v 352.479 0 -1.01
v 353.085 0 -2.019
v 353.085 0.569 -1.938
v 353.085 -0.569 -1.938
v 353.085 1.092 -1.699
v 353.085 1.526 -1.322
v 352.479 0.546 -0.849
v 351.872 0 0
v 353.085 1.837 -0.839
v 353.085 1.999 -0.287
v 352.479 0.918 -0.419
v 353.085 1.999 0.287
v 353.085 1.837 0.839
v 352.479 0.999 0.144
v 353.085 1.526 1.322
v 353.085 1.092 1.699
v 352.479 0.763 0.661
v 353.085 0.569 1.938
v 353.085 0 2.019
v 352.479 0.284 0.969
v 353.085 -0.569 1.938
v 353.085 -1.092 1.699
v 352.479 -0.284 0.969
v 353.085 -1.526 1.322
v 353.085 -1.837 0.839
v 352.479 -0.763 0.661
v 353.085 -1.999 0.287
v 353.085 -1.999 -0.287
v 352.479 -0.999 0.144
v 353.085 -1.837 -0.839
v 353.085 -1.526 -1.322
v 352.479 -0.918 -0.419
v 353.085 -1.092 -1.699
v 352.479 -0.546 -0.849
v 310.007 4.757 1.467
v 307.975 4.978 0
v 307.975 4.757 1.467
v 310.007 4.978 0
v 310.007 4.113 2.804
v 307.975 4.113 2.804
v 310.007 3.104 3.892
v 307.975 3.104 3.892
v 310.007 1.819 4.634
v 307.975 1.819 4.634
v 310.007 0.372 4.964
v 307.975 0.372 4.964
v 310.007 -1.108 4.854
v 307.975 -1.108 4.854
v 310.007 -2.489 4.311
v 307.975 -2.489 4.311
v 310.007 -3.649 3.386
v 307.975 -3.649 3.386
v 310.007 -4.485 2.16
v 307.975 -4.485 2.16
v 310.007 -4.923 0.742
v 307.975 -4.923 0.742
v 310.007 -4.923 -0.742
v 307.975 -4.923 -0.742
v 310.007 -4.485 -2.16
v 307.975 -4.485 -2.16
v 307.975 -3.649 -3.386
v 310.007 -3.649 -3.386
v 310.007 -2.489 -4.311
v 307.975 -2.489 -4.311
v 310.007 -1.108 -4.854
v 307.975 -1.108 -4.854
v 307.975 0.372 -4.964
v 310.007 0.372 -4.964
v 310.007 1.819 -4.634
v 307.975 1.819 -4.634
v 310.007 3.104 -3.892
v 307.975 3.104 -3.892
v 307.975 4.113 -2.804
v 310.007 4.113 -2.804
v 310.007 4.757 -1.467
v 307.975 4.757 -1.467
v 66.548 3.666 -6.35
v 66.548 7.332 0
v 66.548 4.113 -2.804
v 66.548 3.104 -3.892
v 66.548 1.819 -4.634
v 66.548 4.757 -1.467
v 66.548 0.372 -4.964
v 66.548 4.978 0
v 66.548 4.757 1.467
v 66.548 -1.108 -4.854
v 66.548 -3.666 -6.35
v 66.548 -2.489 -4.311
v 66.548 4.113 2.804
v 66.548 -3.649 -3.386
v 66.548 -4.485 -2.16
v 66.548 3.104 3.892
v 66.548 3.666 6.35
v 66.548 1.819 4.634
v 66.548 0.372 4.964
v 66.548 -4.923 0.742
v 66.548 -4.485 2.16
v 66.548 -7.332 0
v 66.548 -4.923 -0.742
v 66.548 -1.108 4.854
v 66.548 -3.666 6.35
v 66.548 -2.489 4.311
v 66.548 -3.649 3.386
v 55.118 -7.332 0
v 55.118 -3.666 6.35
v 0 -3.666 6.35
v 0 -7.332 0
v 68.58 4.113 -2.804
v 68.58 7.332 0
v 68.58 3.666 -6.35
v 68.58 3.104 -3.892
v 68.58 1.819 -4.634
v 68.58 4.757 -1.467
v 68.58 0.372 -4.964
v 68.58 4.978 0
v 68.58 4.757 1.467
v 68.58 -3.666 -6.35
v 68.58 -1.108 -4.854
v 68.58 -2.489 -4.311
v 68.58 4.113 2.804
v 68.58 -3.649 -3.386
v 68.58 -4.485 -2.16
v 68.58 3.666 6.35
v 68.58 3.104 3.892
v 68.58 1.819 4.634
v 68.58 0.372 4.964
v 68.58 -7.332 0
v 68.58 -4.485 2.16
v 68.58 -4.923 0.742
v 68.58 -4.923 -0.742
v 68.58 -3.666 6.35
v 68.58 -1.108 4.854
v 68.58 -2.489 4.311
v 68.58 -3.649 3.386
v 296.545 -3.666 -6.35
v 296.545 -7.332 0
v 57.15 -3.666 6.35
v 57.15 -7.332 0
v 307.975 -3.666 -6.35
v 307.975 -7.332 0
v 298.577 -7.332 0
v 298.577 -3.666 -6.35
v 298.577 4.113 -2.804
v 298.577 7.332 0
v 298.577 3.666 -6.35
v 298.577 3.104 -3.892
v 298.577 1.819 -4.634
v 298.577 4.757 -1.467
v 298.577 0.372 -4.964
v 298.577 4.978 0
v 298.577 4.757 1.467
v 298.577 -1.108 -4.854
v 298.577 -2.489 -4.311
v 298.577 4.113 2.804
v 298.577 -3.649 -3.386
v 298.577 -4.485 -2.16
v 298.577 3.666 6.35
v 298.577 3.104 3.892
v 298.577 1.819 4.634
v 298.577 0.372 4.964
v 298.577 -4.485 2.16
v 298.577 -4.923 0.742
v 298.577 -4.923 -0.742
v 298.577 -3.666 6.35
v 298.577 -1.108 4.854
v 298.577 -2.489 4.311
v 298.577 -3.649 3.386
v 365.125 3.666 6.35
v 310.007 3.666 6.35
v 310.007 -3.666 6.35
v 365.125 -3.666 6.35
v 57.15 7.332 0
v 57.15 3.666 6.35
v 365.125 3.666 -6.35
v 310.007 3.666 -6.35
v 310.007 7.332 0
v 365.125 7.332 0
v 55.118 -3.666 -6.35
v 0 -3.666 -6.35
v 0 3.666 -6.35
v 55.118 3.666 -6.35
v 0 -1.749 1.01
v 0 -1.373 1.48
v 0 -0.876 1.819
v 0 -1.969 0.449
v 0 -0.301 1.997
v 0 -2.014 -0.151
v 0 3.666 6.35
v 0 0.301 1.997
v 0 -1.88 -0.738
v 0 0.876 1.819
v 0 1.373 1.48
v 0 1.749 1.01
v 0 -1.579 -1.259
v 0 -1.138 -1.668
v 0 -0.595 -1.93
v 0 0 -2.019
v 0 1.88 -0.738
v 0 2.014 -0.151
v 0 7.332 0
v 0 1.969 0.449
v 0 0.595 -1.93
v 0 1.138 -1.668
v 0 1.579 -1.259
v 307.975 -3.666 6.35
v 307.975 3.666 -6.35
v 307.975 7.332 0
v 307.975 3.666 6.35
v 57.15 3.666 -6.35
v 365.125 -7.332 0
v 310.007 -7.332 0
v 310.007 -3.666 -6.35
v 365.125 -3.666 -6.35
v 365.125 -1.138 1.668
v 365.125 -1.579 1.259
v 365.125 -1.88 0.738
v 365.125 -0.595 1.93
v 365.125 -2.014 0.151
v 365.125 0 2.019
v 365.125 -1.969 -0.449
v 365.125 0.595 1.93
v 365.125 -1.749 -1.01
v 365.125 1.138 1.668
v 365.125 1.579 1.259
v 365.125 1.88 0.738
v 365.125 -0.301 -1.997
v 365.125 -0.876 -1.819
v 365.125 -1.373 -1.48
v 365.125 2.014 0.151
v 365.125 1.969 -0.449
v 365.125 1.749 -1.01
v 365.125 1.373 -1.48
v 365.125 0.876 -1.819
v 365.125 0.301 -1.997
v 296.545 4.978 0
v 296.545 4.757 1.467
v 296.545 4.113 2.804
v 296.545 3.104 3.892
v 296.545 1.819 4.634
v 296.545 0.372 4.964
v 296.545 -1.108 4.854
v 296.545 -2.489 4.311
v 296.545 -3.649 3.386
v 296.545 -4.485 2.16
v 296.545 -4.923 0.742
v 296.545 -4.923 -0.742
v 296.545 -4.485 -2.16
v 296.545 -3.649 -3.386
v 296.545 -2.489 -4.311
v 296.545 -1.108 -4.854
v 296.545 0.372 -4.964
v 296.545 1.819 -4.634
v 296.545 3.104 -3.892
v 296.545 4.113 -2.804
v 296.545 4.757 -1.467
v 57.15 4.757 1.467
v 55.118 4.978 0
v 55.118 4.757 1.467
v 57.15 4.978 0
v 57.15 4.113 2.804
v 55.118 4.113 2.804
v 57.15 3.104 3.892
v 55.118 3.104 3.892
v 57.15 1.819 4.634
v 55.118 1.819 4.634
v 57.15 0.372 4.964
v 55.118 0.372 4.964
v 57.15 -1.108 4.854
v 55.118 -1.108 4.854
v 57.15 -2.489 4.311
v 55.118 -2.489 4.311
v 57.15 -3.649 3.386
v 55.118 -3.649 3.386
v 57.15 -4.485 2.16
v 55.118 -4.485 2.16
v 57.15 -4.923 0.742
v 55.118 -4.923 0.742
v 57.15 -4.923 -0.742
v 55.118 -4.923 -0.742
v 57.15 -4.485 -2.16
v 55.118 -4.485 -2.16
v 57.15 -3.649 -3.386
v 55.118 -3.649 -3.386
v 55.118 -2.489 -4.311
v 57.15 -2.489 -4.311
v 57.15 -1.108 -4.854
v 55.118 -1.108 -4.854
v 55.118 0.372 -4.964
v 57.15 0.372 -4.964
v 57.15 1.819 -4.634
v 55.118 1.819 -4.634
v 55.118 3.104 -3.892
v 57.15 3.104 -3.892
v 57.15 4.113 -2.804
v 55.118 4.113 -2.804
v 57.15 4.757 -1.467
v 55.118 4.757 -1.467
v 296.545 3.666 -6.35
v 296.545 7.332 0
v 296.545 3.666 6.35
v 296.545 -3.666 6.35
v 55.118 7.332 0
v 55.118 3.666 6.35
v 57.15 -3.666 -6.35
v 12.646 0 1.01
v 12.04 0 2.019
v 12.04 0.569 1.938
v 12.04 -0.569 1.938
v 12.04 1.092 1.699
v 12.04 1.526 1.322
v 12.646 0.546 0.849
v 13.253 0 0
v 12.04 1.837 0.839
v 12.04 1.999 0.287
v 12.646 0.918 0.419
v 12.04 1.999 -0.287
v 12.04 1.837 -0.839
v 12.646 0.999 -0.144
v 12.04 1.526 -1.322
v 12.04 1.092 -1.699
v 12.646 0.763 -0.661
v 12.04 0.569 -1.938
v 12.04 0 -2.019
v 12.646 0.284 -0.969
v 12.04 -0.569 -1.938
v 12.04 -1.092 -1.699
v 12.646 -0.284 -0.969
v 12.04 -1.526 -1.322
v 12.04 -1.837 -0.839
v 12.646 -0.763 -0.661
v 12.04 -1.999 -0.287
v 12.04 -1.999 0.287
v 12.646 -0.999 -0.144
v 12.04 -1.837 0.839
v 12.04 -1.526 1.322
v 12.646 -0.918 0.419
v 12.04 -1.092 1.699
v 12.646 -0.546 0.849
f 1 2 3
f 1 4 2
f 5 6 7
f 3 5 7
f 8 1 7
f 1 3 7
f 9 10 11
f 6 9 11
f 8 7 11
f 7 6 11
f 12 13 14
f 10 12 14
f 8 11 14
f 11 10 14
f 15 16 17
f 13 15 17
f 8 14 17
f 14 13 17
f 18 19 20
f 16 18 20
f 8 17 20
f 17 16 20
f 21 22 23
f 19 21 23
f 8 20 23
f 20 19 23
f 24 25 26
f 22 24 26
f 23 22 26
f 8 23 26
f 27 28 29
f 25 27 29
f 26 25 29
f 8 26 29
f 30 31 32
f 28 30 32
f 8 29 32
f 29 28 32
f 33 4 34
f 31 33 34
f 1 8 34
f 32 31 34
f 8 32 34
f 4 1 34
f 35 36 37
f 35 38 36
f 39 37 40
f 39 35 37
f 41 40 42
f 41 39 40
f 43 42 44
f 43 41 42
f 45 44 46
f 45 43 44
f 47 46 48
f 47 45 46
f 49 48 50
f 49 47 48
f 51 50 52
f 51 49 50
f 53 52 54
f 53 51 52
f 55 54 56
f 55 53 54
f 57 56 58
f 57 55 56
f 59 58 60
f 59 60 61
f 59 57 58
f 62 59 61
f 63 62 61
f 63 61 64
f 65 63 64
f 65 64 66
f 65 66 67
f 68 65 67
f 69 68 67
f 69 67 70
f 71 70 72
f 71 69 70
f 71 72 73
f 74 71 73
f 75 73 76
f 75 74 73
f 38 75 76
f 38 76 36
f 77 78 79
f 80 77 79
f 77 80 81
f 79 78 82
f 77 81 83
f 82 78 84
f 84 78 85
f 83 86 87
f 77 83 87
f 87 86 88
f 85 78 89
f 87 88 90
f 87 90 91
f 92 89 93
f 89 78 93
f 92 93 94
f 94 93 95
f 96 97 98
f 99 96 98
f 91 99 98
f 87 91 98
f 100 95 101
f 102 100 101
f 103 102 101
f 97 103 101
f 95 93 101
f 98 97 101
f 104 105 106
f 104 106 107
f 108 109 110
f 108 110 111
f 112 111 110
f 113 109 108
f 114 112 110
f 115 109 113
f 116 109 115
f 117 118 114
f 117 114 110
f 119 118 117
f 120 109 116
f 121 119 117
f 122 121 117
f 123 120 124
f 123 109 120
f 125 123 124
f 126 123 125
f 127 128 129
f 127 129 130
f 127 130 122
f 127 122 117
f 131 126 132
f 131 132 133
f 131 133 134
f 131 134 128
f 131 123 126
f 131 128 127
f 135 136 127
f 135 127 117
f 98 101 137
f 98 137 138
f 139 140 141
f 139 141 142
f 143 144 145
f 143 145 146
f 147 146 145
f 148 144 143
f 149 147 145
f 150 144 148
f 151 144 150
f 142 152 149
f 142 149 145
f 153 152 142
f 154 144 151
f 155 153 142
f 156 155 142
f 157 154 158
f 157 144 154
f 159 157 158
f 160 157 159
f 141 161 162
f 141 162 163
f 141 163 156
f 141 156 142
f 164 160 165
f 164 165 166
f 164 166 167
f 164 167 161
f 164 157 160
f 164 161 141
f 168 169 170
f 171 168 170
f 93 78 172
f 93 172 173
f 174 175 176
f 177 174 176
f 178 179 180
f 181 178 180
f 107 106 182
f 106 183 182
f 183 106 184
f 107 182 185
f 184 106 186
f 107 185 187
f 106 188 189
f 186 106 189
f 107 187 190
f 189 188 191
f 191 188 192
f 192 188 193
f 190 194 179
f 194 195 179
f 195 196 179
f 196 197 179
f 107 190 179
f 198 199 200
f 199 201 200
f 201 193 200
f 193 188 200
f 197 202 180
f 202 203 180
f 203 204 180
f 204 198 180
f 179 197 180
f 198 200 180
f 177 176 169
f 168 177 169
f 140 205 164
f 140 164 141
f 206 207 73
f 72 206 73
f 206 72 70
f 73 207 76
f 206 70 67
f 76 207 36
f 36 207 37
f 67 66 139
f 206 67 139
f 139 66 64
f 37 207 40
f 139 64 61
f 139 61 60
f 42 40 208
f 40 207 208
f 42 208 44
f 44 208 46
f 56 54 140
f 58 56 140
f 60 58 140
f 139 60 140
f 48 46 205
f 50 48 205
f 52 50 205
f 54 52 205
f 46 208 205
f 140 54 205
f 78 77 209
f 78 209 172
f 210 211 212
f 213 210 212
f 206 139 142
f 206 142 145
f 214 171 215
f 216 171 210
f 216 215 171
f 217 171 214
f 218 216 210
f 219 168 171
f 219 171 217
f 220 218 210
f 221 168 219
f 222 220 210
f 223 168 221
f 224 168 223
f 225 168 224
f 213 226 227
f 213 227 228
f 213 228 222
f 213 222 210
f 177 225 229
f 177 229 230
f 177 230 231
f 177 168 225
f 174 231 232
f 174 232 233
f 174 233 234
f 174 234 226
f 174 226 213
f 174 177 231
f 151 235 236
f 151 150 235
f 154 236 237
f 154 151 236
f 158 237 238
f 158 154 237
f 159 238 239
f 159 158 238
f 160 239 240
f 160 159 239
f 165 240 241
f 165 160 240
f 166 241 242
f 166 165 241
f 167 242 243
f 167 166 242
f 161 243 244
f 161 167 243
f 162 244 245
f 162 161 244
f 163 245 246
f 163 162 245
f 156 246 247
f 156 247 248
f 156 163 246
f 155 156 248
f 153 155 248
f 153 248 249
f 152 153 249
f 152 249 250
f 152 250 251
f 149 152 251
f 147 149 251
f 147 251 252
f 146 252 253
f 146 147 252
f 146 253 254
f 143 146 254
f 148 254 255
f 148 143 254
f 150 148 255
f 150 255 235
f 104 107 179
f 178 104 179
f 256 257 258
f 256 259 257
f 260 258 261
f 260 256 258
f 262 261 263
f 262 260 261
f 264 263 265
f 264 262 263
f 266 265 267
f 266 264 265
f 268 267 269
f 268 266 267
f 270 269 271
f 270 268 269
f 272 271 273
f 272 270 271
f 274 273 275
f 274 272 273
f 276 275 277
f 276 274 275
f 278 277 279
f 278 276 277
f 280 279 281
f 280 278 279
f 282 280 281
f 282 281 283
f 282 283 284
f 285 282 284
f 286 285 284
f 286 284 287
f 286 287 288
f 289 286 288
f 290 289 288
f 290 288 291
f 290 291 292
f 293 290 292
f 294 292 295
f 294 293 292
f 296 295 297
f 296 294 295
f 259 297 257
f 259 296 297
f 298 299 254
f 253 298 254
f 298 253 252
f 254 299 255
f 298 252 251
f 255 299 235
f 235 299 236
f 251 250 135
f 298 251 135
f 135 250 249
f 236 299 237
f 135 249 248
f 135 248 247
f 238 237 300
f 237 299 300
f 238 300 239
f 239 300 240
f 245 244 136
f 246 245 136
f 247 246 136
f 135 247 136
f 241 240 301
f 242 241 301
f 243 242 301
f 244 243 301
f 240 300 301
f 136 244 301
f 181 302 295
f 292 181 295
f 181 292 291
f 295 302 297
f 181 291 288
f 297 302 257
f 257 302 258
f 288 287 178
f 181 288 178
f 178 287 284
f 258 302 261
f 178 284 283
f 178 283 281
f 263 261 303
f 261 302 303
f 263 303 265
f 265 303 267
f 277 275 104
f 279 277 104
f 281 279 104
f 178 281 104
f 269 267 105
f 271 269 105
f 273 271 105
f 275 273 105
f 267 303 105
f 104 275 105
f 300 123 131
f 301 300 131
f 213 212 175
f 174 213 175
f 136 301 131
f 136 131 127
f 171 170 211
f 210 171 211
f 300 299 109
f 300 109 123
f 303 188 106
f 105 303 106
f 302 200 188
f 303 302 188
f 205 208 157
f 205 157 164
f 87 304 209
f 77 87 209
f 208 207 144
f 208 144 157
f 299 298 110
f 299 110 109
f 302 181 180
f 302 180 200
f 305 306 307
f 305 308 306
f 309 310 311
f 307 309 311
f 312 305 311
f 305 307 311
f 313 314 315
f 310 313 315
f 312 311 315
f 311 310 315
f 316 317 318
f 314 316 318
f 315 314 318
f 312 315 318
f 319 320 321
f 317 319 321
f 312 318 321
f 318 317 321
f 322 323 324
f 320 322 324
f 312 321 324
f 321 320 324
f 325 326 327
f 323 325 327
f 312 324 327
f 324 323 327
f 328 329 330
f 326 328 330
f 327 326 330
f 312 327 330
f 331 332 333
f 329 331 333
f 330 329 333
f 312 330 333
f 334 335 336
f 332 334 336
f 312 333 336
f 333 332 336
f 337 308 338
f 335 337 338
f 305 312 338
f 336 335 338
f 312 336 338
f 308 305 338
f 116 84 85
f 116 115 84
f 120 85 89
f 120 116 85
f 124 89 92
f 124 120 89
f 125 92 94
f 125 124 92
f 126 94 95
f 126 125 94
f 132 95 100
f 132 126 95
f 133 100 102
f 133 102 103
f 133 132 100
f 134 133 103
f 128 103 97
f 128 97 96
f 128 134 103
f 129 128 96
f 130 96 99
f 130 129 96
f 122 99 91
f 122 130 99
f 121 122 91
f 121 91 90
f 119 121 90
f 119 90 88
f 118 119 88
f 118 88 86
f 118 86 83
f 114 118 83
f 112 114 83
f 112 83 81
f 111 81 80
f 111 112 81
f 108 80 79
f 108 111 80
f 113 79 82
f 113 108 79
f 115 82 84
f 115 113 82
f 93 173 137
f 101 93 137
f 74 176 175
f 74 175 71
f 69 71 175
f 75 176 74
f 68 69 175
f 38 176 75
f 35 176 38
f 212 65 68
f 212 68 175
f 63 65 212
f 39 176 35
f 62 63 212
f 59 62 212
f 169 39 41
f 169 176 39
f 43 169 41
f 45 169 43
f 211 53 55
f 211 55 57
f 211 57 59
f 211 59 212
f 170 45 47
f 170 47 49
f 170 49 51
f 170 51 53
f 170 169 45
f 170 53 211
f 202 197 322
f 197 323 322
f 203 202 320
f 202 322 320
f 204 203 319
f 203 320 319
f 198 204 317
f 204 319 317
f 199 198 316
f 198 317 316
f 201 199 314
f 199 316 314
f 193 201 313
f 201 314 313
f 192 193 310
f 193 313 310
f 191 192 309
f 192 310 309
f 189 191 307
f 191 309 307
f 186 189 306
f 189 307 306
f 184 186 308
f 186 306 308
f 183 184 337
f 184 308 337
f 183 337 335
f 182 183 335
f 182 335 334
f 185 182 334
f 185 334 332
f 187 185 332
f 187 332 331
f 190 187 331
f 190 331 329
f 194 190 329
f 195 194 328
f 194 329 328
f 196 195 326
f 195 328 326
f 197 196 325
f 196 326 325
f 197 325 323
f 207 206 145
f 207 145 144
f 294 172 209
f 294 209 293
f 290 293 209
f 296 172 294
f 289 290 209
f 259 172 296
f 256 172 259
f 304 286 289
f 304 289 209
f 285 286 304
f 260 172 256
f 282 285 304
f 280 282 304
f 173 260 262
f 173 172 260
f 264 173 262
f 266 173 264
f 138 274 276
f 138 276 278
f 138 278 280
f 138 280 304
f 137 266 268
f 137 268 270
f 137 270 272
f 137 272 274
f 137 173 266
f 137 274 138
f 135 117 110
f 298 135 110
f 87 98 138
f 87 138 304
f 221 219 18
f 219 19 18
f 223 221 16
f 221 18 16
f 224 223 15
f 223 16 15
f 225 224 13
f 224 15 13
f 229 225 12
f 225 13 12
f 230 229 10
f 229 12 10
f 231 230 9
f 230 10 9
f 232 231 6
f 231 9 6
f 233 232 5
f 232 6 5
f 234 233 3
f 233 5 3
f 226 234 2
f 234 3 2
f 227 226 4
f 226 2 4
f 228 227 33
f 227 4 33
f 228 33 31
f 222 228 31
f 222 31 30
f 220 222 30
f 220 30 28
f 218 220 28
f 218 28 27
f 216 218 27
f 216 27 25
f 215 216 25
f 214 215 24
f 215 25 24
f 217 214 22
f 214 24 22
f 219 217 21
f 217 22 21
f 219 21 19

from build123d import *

# Parameters (mm, degrees)
BOSS_EXTRUDE1_DEPTH        = 365.125
F_10_32_TAPPED_HOLE1_D     = 4.0386
F_10_32_TAPPED_HOLE1_DEPTH = 12.0396
F_10_32_TAPPED_HOLE1_TIP   = 1.213317848
F_10_32_TAPPED_HOLE2_D     = 4.0386
F_10_32_TAPPED_HOLE2_DEPTH = 12.0396
F_10_32_TAPPED_HOLE2_TIP   = 1.213317848
SKETCH6_W                  = 2.032
SKETCH6_H                  = 2.353948419


with BuildPart() as part:
    # Sketch1 → Boss-Extrude1 (new body)
    with BuildSketch(Plane(origin=(0, 0, 0), x_dir=(0, 0, -1), z_dir=(1, 0, 0))):
        Polygon((0, 7.332348419), (-6.35, 3.666174209), (-6.35, -3.666174209), (0, -7.332348419), (6.35, -3.666174209), (6.35, 3.666174209), align=None)
    extrude(amount=BOSS_EXTRUDE1_DEPTH)

    # #10-32 Tapped Hole1
    with Locations(Plane(origin=(365.125, 0, 0), x_dir=(0, 0, -1), z_dir=(1, 0, 0))):
        with Locations((0, 0)):
            Hole(F_10_32_TAPPED_HOLE1_D / 2, depth=F_10_32_TAPPED_HOLE1_DEPTH)
            with Locations((0, 0, -(F_10_32_TAPPED_HOLE1_DEPTH + F_10_32_TAPPED_HOLE1_TIP / 2))):  # 118° drill point
                Cone(0, F_10_32_TAPPED_HOLE1_D / 2, F_10_32_TAPPED_HOLE1_TIP, mode=Mode.SUBTRACT)

    # #10-32 Tapped Hole2
    with Locations(Plane.ZY):
        with Locations((0, 0)):
            Hole(F_10_32_TAPPED_HOLE2_D / 2, depth=F_10_32_TAPPED_HOLE2_DEPTH)
            with Locations((0, 0, -(F_10_32_TAPPED_HOLE2_DEPTH + F_10_32_TAPPED_HOLE2_TIP / 2))):  # 118° drill point
                Cone(0, F_10_32_TAPPED_HOLE2_D / 2, F_10_32_TAPPED_HOLE2_TIP, mode=Mode.SUBTRACT)

    # Sketch6 → Cut-Revolve1 (revolve, cut)
    with BuildSketch(Plane.XY):
        with Locations((56.134, 6.15537421)):
            Rectangle(SKETCH6_W, SKETCH6_H)
        with Locations((67.564, 6.15537421)):
            Rectangle(SKETCH6_W, SKETCH6_H)
        with Locations((297.561, 6.15537421)):
            Rectangle(SKETCH6_W, SKETCH6_H)
        with Locations((308.991, 6.15537421)):
            Rectangle(SKETCH6_W, SKETCH6_H)
    revolve(axis=Axis((0, 0, 0), (1, 0, 0)), mode=Mode.SUBTRACT)


solid = part.part
